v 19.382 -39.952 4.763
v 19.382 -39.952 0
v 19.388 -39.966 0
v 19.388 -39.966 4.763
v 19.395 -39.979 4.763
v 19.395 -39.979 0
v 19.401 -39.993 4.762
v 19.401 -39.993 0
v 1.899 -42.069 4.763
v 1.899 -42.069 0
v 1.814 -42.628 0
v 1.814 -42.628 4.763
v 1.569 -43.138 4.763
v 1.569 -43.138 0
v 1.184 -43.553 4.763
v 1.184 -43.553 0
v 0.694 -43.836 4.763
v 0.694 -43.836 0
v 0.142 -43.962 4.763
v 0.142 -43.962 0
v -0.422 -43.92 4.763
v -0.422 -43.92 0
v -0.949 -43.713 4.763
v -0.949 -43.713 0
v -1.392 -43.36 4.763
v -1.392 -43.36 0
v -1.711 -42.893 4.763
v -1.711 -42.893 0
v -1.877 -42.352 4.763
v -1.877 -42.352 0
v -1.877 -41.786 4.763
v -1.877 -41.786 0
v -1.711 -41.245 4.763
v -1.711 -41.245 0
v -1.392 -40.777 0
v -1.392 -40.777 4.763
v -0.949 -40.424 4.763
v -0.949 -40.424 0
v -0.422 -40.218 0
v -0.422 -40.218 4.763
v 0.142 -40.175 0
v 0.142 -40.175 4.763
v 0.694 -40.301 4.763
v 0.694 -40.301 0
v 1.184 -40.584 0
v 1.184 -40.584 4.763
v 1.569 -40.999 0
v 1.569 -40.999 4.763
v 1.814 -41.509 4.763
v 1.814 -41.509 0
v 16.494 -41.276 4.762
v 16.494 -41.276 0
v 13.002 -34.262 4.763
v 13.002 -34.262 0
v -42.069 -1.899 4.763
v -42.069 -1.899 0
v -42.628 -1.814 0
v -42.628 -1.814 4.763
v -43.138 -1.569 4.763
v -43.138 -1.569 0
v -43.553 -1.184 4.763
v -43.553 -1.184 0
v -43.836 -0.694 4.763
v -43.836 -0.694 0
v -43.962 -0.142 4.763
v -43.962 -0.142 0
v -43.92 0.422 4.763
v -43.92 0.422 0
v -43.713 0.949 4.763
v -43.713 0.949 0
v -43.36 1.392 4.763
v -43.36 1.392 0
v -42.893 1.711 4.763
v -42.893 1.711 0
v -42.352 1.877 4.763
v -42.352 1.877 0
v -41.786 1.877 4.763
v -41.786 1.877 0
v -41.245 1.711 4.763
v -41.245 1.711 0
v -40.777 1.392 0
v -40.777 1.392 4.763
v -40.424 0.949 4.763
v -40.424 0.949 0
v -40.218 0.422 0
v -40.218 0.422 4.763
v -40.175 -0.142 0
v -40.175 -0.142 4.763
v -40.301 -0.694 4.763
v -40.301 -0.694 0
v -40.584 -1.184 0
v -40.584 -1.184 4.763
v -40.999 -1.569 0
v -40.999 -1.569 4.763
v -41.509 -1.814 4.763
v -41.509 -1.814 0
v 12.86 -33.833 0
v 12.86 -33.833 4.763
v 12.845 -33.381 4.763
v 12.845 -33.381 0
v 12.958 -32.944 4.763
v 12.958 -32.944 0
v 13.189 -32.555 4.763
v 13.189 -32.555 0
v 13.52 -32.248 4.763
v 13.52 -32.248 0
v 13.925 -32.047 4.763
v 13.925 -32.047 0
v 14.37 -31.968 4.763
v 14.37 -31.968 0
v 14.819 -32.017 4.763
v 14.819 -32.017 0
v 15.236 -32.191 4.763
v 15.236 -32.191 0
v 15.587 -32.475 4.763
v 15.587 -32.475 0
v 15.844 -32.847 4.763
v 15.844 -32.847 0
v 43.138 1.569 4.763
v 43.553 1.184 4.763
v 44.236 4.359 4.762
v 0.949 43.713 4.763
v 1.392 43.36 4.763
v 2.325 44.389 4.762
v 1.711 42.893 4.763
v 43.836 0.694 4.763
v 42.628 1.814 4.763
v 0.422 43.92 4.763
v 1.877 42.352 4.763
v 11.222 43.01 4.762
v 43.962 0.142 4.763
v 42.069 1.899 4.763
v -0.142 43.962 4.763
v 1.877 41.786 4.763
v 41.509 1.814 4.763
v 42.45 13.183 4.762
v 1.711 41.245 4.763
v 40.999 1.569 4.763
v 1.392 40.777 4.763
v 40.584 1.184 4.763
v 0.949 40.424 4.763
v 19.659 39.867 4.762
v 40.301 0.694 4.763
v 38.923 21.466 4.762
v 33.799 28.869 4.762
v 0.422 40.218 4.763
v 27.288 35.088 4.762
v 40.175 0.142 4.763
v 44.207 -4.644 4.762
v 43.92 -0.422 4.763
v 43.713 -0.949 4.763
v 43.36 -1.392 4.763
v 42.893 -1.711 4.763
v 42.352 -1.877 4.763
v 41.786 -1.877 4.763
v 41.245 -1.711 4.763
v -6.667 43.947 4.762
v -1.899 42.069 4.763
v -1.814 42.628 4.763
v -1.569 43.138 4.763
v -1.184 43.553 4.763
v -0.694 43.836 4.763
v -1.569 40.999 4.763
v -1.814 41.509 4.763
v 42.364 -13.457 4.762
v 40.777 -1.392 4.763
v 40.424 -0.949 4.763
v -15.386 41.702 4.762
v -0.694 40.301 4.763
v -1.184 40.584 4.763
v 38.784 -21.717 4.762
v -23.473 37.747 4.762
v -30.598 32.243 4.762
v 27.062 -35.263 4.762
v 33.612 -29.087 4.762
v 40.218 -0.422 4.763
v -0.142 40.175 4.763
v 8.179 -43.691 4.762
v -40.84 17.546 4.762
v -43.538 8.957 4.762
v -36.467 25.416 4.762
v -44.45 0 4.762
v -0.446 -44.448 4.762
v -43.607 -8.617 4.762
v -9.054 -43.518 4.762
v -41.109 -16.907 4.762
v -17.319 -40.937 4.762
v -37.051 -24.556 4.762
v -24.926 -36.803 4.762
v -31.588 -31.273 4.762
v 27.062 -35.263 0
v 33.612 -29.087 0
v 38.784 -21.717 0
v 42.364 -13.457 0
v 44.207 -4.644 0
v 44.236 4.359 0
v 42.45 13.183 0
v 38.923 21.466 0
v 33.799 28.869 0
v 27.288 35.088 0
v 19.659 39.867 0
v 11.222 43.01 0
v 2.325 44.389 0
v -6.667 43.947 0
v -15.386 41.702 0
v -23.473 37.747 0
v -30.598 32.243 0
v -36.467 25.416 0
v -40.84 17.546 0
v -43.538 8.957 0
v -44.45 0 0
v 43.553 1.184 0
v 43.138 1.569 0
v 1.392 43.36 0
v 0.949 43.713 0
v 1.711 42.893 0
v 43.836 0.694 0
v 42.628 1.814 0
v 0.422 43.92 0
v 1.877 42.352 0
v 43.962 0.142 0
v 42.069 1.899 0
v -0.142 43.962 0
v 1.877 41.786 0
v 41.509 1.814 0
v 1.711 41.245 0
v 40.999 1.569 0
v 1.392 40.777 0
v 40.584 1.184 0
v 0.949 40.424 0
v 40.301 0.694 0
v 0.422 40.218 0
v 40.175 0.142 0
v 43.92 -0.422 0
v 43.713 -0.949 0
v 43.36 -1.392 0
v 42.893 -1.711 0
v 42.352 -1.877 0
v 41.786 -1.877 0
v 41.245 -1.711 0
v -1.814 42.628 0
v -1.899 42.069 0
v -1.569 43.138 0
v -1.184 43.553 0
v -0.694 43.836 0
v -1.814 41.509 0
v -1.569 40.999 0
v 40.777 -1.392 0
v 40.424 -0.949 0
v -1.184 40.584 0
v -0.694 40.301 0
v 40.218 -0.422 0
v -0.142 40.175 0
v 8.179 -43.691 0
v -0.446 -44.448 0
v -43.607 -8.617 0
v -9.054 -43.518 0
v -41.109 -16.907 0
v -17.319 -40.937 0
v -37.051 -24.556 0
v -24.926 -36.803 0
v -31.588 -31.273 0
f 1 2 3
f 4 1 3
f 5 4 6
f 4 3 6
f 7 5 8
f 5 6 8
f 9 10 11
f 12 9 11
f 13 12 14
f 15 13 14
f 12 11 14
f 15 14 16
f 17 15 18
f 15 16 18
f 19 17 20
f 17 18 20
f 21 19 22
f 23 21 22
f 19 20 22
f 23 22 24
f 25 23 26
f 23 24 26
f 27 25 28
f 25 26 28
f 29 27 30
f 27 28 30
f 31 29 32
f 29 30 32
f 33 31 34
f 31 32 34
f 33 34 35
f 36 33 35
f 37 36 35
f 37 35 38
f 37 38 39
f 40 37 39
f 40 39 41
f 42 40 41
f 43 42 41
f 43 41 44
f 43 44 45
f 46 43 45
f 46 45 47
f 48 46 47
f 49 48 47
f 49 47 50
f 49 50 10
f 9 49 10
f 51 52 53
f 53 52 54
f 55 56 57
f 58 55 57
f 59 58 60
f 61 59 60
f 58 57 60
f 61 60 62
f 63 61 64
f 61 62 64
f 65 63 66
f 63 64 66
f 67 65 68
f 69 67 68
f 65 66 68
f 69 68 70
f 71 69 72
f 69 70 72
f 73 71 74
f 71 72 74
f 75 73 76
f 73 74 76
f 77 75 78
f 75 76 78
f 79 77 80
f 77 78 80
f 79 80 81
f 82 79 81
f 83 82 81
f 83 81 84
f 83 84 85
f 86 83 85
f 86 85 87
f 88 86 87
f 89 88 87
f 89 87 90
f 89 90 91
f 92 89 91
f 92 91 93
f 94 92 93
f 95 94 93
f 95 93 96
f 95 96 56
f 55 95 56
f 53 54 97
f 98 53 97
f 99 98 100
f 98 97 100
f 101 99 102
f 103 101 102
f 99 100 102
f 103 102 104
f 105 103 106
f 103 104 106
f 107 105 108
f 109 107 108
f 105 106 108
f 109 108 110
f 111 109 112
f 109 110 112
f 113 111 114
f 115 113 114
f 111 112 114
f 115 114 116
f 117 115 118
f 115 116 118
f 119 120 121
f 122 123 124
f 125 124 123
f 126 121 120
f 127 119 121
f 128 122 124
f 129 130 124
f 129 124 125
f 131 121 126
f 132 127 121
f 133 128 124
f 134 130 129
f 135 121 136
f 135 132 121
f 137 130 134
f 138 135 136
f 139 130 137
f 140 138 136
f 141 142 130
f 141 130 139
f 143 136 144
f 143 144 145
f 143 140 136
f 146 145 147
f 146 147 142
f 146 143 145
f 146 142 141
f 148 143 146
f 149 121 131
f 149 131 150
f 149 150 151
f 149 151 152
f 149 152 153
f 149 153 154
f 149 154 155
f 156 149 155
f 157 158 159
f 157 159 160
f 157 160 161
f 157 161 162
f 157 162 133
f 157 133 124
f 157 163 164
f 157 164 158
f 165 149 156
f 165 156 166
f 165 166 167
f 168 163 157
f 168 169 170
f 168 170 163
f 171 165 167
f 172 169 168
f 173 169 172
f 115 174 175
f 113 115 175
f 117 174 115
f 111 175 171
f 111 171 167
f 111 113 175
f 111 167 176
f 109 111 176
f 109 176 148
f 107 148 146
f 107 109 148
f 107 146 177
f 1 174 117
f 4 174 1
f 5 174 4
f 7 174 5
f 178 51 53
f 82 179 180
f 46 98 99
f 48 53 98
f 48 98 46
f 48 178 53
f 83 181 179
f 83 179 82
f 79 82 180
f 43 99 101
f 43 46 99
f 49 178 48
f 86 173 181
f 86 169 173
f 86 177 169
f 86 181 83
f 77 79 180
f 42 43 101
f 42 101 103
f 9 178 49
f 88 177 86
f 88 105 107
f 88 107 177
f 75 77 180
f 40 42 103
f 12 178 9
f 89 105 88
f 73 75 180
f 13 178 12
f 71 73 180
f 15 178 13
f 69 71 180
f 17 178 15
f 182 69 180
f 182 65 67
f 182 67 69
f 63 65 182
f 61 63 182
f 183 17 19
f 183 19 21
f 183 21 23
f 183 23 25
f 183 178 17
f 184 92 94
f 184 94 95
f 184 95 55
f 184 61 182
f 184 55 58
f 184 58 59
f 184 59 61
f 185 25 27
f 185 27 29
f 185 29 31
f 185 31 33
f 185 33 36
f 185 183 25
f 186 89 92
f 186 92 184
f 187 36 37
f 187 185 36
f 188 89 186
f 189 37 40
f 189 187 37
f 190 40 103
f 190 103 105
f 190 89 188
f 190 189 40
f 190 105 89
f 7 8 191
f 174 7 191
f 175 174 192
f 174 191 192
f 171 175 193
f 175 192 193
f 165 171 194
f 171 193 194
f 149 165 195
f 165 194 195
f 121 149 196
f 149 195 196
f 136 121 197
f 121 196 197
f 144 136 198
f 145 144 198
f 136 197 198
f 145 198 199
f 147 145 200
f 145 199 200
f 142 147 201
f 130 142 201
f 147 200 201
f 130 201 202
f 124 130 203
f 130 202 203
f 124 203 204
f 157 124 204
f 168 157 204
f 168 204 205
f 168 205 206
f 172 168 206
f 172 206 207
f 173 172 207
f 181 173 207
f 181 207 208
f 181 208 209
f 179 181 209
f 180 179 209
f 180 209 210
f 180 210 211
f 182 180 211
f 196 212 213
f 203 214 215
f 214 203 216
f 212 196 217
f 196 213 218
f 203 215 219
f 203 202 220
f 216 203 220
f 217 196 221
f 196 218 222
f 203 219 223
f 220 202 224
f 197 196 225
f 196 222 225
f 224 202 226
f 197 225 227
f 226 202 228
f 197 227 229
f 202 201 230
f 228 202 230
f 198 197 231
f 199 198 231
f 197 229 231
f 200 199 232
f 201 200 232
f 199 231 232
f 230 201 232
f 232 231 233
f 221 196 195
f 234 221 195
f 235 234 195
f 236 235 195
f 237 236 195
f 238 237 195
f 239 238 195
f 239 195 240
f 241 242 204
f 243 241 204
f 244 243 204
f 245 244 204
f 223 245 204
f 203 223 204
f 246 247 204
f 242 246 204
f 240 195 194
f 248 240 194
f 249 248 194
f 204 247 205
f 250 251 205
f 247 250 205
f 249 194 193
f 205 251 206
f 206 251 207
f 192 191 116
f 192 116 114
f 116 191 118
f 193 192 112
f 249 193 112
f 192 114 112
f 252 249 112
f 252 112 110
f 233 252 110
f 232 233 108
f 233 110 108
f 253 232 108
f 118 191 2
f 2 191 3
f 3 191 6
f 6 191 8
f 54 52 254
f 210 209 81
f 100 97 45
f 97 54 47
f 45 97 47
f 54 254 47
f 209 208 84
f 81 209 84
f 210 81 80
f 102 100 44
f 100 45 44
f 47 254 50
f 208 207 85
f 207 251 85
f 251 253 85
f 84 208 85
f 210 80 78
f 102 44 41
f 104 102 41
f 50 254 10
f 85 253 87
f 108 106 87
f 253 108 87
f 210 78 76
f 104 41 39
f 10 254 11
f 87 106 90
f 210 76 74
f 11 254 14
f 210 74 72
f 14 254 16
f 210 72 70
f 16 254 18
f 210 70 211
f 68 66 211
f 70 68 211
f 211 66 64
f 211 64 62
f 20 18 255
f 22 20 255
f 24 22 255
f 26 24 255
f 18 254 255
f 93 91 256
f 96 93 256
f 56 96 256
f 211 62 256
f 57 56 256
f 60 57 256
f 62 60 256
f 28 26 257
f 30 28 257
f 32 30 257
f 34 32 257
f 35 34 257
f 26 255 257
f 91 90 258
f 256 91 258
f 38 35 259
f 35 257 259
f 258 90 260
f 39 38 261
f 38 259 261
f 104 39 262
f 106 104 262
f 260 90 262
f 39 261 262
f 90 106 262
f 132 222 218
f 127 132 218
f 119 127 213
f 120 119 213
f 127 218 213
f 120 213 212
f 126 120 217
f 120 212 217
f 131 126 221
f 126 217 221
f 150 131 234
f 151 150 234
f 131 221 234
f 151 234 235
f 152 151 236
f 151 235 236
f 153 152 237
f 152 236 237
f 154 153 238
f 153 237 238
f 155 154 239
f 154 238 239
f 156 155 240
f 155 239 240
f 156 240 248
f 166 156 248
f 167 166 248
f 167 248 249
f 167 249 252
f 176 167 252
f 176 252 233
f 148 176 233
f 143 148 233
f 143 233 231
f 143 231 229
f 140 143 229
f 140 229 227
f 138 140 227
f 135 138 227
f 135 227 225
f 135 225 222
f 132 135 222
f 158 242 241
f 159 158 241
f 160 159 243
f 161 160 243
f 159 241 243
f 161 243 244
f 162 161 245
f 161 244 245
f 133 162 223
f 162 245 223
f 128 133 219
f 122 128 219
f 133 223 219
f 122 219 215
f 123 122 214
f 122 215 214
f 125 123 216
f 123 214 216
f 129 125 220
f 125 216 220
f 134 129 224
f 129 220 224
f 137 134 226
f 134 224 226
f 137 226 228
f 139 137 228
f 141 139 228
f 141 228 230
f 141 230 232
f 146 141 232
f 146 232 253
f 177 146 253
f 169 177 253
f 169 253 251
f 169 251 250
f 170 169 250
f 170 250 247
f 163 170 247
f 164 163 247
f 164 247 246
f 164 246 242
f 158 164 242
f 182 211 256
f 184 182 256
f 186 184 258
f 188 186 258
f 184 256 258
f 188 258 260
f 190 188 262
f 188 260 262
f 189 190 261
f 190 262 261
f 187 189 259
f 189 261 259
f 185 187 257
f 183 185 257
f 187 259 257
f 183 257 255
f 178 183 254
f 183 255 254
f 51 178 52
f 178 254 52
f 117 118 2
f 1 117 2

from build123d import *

# Parameters (mm, degrees)
SKETCH2_R               = 44.45
BOSS_EXTRUDE1_DEPTH     = 4.7625
F_6_CLEARANCE_HOLE1_D   = 3.7973
CIRPATTERN1_COUNT       = 4
CUT_EXTRUDE1_DEPTH      = 64.041941644
CUT_EXTRUDE1_DEPTH_BACK = 64.041941644


with BuildPart() as part:
    # Sketch2 → Boss-Extrude1 (new body)
    with BuildSketch(Plane.XY):
        with Locations(Location((0, 0, 0), (0, 0, 180))):
            Circle(SKETCH2_R)
    extrude(amount=BOSS_EXTRUDE1_DEPTH)

    # #6 Clearance Hole1 (through all)
    with Locations(Plane.XY.offset(4.7625)):
        with Locations((0, 42.06875)):
            f_6_clearance_hole1 = Hole(F_6_CLEARANCE_HOLE1_D / 2)

    # CirPattern1: #6 Clearance Hole1 ×4 about axis
    cirpattern1_axis = Axis((0, 0, 0), (0, 0, 1))
    for i in range(1, CIRPATTERN1_COUNT):
        add(f_6_clearance_hole1.rotate(cirpattern1_axis, i * 360 / CIRPATTERN1_COUNT), mode=Mode.SUBTRACT)

    # Sketch5 → Cut-Extrude1 (cut, two sides: drawn at the far end of the back side and taken through both)
    with BuildSketch(Plane.XY.offset(4.7625).offset(-CUT_EXTRUDE1_DEPTH_BACK)):
        with BuildLine():
            Line((16.539365803, -41.367349975), (13.001856878, -34.261722849))
            ThreePointArc((13.001856878, -34.261722849), (13.715480519, -32.133095639), (15.844107729, -32.846719279))
            Line((15.844107729, -32.846719279), (19.381616653, -39.952346405))
            ThreePointArc((19.381616653, -39.952346405), (18.667993013, -42.080973615), (16.539365803, -41.367349975))
        make_face()
    extrude(amount=CUT_EXTRUDE1_DEPTH + CUT_EXTRUDE1_DEPTH_BACK, mode=Mode.SUBTRACT)


solid = part.part
